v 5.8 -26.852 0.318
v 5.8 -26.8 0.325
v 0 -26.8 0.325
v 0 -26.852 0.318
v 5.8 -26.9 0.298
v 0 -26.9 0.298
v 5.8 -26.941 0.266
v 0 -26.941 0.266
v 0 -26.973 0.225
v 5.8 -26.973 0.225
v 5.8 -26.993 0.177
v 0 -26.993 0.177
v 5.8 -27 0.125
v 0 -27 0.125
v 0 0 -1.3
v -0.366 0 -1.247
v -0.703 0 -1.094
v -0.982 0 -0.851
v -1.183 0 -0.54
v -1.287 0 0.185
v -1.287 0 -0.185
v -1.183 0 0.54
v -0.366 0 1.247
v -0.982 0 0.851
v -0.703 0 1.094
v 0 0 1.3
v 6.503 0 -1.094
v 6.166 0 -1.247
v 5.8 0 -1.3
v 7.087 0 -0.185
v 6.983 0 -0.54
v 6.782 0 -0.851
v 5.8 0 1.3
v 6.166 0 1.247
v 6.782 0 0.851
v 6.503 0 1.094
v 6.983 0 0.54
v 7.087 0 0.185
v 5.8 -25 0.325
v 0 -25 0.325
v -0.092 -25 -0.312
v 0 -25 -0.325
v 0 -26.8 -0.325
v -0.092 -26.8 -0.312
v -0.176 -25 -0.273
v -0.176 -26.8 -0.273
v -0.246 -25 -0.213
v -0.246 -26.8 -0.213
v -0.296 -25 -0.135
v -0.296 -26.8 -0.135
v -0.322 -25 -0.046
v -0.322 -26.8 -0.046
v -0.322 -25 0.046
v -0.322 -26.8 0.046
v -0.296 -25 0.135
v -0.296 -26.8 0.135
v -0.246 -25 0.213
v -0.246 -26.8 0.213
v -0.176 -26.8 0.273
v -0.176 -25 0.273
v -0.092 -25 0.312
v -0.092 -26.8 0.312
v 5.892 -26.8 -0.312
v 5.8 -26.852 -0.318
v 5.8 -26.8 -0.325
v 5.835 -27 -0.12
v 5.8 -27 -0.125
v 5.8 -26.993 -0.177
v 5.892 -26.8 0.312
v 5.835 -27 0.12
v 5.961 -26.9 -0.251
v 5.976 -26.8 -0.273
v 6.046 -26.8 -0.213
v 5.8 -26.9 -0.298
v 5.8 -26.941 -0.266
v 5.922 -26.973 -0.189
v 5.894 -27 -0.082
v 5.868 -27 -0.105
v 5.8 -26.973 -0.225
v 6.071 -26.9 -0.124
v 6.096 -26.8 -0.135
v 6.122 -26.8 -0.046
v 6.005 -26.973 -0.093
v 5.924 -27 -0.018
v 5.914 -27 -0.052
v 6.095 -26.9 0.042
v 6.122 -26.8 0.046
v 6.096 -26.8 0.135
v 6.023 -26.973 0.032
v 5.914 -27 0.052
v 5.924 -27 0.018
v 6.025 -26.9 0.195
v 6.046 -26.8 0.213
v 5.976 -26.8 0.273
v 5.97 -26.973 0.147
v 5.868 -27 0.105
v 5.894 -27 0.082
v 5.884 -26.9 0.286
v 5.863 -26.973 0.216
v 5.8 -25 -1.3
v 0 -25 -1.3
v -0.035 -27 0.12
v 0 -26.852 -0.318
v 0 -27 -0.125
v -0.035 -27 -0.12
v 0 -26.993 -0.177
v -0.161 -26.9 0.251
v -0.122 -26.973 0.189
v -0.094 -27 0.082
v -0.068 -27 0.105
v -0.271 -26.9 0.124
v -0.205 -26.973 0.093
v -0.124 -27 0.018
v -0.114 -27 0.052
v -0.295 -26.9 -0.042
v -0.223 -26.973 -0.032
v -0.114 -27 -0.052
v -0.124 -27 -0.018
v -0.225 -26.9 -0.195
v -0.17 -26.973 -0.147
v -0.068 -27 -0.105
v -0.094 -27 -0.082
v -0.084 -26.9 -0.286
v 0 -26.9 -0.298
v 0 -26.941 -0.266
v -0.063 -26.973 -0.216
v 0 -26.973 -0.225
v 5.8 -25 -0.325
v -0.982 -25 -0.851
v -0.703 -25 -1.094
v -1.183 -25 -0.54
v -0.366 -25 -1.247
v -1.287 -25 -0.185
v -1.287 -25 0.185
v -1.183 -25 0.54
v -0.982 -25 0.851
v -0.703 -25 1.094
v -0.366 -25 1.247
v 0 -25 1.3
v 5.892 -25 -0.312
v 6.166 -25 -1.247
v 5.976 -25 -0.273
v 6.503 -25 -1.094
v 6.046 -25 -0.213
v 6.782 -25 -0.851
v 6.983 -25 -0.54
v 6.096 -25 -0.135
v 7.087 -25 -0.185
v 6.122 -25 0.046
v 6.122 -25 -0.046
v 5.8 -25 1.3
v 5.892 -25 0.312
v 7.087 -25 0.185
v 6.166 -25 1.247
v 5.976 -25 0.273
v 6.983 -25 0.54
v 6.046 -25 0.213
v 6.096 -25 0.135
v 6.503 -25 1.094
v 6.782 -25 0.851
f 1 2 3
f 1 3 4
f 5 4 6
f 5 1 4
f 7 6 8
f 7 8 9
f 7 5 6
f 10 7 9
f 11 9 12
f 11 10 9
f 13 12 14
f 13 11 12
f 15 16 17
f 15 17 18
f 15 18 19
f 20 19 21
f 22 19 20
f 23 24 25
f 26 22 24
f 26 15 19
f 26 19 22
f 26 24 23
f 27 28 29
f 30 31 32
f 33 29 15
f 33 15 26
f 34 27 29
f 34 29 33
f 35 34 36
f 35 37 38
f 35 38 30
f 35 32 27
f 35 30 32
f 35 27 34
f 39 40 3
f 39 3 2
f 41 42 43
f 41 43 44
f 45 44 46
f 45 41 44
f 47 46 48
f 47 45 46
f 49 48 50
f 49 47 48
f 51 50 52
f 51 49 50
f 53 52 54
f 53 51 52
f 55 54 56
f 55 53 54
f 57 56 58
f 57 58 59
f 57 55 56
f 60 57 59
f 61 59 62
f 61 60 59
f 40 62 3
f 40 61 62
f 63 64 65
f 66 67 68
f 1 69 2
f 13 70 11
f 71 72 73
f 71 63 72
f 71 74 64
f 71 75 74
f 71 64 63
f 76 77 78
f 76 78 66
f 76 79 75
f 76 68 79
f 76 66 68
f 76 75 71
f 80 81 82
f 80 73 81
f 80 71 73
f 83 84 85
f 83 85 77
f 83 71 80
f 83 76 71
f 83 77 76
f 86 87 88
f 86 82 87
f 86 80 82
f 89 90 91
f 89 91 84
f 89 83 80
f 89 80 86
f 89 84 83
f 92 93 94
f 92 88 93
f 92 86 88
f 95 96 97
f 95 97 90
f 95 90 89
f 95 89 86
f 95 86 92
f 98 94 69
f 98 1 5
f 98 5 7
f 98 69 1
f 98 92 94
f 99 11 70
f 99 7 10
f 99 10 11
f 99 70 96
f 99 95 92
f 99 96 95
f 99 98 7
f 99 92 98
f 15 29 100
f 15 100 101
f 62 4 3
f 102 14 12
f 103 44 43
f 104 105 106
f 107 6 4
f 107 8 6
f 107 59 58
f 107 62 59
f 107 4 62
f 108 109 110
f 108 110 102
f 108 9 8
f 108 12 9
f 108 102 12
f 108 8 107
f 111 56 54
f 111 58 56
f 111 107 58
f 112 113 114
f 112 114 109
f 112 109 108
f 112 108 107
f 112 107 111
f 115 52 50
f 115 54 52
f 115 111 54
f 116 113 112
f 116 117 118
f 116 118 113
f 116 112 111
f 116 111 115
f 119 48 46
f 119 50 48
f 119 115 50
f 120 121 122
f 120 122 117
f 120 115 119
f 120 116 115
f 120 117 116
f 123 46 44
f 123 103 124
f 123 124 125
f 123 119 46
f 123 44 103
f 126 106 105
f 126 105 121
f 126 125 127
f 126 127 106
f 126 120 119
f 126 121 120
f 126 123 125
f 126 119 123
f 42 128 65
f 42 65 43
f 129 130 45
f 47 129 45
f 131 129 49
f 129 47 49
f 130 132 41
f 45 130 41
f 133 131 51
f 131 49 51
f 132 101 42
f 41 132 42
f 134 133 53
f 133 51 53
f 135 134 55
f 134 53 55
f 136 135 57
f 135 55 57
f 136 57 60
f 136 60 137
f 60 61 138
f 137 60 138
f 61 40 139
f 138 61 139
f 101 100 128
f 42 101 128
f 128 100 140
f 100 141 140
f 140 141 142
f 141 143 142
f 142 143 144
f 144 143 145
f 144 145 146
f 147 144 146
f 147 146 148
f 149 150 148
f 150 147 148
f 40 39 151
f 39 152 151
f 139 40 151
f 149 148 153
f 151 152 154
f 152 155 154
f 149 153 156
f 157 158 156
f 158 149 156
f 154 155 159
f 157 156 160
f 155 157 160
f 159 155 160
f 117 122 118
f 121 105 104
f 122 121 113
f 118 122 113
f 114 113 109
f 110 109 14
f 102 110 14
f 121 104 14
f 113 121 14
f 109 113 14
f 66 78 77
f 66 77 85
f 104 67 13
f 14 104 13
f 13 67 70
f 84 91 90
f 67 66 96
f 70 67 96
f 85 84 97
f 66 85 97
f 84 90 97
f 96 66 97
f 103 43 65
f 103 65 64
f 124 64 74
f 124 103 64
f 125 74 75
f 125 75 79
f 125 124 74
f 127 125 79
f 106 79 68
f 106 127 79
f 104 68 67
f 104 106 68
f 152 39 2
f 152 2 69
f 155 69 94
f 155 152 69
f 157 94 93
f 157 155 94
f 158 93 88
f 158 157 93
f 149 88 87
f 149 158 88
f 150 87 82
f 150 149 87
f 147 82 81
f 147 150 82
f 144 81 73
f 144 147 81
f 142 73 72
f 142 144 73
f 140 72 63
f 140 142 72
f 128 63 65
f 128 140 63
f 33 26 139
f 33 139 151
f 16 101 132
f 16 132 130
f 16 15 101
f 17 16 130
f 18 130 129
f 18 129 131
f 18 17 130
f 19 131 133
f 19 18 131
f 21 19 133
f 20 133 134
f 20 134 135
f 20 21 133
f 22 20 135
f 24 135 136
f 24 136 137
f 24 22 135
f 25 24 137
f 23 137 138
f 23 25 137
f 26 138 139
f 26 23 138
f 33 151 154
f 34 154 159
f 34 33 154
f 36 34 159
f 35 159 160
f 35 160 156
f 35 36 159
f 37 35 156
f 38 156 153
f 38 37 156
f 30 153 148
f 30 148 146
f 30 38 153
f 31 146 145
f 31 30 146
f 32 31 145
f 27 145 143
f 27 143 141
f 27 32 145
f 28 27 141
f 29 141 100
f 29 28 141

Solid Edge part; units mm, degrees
sketch "Sketch1" plane through (0, 0, 0) normal (0, -1, 0) x (1, 0, 0)
  line L0 (0, 1.3) -> (5.8, 1.3)
  line L1 (5.8, -1.3) -> (0, -1.3)
  arc A0 (5.8, 1.3) -> (5.8, -1.3) centre (5.8, 0) cw
  arc A1 (0, -1.3) -> (0, 1.3) centre (0, 0) cw
extrude "Protrusion1" add sketch "Sketch1" along normal blind 25
sketch "Sketch2" plane through (2.6, -25, 0) normal (0, -1, 0) x (1, 0, 0)
  line L0 (-2.6, 0.325) -> (3.2, 0.325)
  line L1 (3.2, -0.325) -> (-2.6, -0.325)
  arc A0 (3.2, 0.325) -> (3.2, -0.325) centre (3.2, 0) cw
  arc A1 (-2.6, -0.325) -> (-2.6, 0.325) centre (-2.6, 0) cw
extrude "ExtrudedProtrusion_2" add sketch "Sketch2" along normal blind 2
fillet "Round_2" radius 0.2 4 edges at (2.9, -27, 0.325) (2.9, -27, -0.325) (6.125, -27, 0) (-0.325, -27, 0)
